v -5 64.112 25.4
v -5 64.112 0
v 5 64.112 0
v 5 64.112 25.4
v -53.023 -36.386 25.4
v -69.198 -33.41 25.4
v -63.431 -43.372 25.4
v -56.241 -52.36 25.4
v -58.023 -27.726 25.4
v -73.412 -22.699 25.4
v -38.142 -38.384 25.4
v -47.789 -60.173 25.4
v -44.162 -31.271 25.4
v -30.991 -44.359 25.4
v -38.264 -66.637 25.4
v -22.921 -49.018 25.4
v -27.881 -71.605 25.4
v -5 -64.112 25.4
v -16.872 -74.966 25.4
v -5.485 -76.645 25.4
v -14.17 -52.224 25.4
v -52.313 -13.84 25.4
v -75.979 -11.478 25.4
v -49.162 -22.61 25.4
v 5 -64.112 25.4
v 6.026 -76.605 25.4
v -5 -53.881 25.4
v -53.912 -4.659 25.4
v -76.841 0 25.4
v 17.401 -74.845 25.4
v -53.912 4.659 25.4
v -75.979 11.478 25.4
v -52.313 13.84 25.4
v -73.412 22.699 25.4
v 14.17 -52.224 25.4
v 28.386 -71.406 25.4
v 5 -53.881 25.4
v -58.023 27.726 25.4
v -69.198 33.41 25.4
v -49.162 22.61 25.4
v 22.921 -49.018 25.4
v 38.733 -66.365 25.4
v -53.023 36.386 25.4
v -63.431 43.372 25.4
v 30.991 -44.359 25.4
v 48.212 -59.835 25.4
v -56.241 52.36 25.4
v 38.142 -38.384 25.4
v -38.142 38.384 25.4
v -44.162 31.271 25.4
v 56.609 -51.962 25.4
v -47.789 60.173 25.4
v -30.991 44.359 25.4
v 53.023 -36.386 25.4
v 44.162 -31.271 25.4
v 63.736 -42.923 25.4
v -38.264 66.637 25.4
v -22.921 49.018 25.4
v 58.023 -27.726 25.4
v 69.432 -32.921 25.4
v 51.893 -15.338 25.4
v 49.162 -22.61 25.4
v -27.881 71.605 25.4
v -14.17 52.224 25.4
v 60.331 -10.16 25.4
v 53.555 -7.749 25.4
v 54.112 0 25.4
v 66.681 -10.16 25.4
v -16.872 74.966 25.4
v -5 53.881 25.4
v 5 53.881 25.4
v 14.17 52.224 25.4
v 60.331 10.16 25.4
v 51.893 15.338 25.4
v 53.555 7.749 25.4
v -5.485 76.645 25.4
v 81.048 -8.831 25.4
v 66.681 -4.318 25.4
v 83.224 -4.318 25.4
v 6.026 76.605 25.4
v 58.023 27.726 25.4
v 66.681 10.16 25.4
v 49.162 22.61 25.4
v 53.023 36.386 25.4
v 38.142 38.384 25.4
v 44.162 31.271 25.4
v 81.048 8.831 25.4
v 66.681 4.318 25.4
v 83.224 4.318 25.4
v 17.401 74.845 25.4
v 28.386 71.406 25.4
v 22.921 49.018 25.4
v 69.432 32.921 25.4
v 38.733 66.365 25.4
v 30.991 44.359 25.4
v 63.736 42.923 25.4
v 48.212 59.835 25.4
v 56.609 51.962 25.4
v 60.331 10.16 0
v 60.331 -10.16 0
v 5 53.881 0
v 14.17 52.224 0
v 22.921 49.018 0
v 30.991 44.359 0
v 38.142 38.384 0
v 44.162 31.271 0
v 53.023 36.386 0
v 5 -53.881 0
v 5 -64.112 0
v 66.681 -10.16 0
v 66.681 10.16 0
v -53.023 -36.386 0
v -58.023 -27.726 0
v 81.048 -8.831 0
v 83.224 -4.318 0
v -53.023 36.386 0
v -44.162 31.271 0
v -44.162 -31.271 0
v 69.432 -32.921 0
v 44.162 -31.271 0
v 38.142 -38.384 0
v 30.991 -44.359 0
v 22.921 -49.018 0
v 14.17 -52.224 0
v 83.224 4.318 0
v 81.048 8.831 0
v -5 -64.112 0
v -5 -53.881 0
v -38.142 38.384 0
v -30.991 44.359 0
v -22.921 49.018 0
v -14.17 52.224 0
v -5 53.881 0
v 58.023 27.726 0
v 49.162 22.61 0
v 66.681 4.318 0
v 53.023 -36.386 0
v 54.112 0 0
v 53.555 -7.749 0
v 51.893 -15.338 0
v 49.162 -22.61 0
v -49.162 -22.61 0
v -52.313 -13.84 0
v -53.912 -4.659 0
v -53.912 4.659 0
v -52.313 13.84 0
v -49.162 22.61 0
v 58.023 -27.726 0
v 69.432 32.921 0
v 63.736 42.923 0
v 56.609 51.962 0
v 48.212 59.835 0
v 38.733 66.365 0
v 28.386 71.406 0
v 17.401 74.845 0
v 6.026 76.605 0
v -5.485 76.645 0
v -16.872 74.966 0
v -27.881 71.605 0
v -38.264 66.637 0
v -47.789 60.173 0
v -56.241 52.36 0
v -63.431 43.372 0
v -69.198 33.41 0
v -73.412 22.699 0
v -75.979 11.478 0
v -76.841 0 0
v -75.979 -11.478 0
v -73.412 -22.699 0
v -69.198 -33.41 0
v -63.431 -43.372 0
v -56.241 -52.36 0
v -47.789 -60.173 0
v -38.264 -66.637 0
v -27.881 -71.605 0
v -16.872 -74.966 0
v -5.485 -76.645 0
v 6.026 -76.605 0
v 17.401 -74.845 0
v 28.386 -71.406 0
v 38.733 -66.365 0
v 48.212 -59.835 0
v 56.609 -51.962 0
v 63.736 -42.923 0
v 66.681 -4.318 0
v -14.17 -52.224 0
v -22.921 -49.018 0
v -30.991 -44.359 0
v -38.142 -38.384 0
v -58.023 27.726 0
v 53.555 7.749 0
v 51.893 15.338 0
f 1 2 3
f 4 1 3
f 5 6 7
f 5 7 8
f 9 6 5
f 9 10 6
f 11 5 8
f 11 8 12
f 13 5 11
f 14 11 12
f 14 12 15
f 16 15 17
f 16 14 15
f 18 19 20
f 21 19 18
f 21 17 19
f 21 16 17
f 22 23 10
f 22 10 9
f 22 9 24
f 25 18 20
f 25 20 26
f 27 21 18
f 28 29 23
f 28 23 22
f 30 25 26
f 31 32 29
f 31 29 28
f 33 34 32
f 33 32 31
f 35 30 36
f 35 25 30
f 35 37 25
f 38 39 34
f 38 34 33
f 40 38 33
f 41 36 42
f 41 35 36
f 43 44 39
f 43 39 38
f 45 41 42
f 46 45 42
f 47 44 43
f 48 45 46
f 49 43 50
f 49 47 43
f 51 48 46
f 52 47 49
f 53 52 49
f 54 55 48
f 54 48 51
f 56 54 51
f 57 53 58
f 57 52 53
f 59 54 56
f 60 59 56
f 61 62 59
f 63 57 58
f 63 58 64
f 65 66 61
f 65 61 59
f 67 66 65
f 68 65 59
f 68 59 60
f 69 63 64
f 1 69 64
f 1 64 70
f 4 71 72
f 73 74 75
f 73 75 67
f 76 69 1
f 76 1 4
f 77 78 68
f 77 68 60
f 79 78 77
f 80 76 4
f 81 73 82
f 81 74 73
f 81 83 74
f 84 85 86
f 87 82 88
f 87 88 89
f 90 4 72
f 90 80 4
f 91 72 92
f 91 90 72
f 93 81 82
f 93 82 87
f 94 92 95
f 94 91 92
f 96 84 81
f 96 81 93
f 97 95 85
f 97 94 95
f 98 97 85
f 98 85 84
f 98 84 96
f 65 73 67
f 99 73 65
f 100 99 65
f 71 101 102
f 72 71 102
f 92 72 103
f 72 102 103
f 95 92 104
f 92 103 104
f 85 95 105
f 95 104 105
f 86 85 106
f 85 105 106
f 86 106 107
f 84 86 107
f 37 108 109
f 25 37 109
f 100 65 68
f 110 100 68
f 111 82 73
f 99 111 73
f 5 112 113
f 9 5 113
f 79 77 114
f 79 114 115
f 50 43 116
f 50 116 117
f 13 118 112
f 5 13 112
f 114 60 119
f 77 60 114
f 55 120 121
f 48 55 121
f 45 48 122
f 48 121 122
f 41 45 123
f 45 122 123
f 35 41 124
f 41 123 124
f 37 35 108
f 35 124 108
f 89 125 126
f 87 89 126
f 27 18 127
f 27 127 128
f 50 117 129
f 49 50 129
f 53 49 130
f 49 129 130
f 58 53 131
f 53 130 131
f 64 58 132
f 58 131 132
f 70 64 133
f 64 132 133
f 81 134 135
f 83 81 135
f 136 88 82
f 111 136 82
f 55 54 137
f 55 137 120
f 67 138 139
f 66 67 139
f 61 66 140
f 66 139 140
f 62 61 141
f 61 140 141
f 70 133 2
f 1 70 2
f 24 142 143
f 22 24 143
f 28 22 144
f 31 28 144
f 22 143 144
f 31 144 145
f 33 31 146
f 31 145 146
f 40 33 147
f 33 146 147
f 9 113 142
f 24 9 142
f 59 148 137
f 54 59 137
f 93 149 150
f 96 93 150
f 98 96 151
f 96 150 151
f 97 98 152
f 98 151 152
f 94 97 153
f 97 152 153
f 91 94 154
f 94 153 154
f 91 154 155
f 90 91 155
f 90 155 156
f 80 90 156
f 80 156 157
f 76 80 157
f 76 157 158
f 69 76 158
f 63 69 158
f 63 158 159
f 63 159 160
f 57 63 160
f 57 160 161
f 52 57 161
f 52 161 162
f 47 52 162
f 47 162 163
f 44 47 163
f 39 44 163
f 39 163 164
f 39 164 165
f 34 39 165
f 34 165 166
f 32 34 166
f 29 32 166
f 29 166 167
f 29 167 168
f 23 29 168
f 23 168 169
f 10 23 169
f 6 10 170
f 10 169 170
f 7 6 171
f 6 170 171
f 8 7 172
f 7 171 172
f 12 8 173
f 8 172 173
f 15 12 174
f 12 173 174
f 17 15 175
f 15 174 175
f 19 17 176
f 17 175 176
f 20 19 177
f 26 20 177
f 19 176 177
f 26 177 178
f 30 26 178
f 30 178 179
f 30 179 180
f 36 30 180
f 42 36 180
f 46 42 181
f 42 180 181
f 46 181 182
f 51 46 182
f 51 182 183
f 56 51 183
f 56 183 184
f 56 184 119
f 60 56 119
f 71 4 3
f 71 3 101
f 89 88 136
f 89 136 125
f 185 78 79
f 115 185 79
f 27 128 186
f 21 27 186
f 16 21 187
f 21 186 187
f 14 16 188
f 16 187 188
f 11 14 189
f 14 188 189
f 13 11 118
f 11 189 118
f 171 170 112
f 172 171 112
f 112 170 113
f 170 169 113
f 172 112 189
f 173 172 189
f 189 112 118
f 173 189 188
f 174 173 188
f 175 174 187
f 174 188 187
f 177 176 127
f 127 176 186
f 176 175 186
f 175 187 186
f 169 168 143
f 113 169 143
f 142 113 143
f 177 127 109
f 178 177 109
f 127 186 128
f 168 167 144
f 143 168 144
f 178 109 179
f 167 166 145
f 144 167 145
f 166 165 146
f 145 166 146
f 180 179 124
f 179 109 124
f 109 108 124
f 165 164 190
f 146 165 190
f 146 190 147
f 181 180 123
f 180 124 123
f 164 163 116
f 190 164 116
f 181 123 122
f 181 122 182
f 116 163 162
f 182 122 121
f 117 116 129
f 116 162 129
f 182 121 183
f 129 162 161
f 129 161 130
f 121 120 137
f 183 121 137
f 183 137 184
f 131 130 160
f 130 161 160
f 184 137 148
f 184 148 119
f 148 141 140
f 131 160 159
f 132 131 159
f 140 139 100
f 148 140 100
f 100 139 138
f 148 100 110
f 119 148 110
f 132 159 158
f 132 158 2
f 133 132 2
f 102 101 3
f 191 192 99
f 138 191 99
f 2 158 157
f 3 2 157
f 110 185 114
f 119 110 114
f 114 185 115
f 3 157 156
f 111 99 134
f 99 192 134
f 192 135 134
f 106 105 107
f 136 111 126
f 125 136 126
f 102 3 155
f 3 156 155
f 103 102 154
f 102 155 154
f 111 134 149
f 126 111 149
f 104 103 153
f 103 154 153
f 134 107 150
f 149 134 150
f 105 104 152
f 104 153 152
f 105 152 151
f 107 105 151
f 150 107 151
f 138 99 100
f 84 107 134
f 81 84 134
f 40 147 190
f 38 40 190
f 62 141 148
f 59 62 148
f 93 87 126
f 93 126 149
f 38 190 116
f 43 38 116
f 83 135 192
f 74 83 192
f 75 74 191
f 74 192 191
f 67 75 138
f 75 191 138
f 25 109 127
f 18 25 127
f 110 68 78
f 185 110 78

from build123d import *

# Parameters (mm, degrees)
F0_R     = 76.841269309
F1_DEPTH = 25.4
F3_DEPTH = 2540
F4_DEPTH = 25.4


with BuildPart() as f1:
    # F0 (on Top) → F1 (new body)
    with BuildSketch(Plane.XY):
        Circle(F0_R)
        with BuildLine():
            ThreePointArc((49.1623187614, 22.610375279), (52.8604702506, 11.5729573203), (54.1125, 0))
            ThreePointArc((54.1125, 0), (52.8604702506, -11.5729573203), (49.1623187614, -22.610375279))
            Line((49.1623187614, -22.610375279), (58.0230537001, -27.7261229811))
            Line((58.0230537001, -27.7261229811), (53.0230537001, -36.3863770189))
            Line((53.0230537001, -36.3863770189), (44.1623187614, -31.2706293168))
            ThreePointArc((44.1623187614, -31.2706293168), (27.05625, -46.8627996623), (5, -53.8810045958))
            Line((5, -53.8810045958), (5, -64.1125))
            Line((5, -64.1125), (-5, -64.1125))
            Line((-5, -64.1125), (-5, -53.8810045958))
            ThreePointArc((-5, -53.8810045958), (-27.05625, -46.8627996623), (-44.1623187614, -31.2706293168))
            Line((-44.1623187614, -31.2706293168), (-53.0230537001, -36.3863770189))
            Line((-53.0230537001, -36.3863770189), (-58.0230537001, -27.7261229811))
            Line((-58.0230537001, -27.7261229811), (-49.1623187614, -22.610375279))
            ThreePointArc((-49.1623187614, -22.610375279), (-54.1125, 0), (-49.1623187614, 22.610375279))
            Line((-49.1623187614, 22.610375279), (-58.0230537001, 27.7261229811))
            Line((-58.0230537001, 27.7261229811), (-53.0230537001, 36.3863770189))
            Line((-53.0230537001, 36.3863770189), (-44.1623187614, 31.2706293168))
            ThreePointArc((-44.1623187614, 31.2706293168), (-27.05625, 46.8627996623), (-5, 53.8810045958))
            Line((-5, 53.8810045958), (-5, 64.1125))
            Line((-5, 64.1125), (5, 64.1125))
            Line((5, 64.1125), (5, 53.8810045958))
            ThreePointArc((5, 53.8810045958), (27.05625, 46.8627996623), (44.1623187614, 31.2706293168))
            Line((44.1623187614, 31.2706293168), (53.0230537001, 36.3863770189))
            Line((53.0230537001, 36.3863770189), (58.0230537001, 27.7261229811))
            Line((58.0230537001, 27.7261229811), (49.1623187614, 22.610375279))
        make_face(mode=Mode.SUBTRACT)
    extrude(amount=F1_DEPTH)

    # F2 (on face) → F3 (cut)
    with BuildSketch(Plane.XY.offset(25.4)):
        with BuildLine():
            Line((60.331269309, 0), (76.841269309, 0))
            ThreePointArc((76.841269309, 0), (76.8109087462, 2.1598533743), (76.7198510493, 4.318))
            Line((76.7198510493, 4.318), (71.6383990579, 4.318))
            Line((71.6383990579, 4.318), (66.681269309, 4.318))
            Line((66.681269309, 4.318), (66.681269309, 10.16))
            Line((66.681269309, 10.16), (60.331269309, 10.16))
            Line((60.331269309, 10.16), (60.331269309, 0))
        make_face()
        with BuildLine():
            Line((66.681269309, -4.318), (71.6383990579, -4.318))
            Line((71.6383990579, -4.318), (76.7198510493, -4.318))
            ThreePointArc((76.7198510493, -4.318), (76.8109087462, -2.1598533743), (76.841269309, 0))
            Line((76.841269309, 0), (60.331269309, 0))
            Line((60.331269309, 0), (60.331269309, -10.16))
            Line((60.331269309, -10.16), (66.681269309, -10.16))
            Line((66.681269309, -10.16), (66.681269309, -4.318))
        make_face()
    extrude(amount=-F3_DEPTH, mode=Mode.SUBTRACT)

    # F2 (on face) → F4 (join)
    with BuildSketch(Plane.XY.offset(25.4)):
        with BuildLine():
            Line((81.0480539402, 8.8309641961), (69.4320089527, 32.9207655108))
            ThreePointArc((69.4320089527, 32.9207655108), (72.3316680057, 25.93666271), (74.5307966821, 18.7013639864))
            add(Edge.make_bspline(
                [(74.5307966821, 18.7013639864), (75.9347240562, 15.3777124362), (77.4050082281, 12.5783342613), (78.9966583252, 10.7205696404)],
                knots=[0.3571653837, 0.3571653837, 0.3571653837, 0.3571653837, 0.6407462723, 0.6407462723, 0.6407462723, 0.6407462723], degree=3))
            add(Edge.make_bspline(
                [(78.9966583252, 10.7205696404), (79.6616242514, 9.944425327), (80.3477738062, 9.3326335024), (81.0480539402, 8.8309641961)],
                knots=[0.6407462723, 0.6407462723, 0.6407462723, 0.6407462723, 0.759221827, 0.759221827, 0.759221827, 0.759221827], degree=3))
        make_face()
        with BuildLine():
            add(Edge.make_bspline(
                [(74.5307966821, 18.7013639864), (75.9347240562, 15.3777124362), (77.4050082281, 12.5783342613), (78.9966583252, 10.7205696404)],
                knots=[0.3571653837, 0.3571653837, 0.3571653837, 0.3571653837, 0.6407462723, 0.6407462723, 0.6407462723, 0.6407462723], degree=3))
            ThreePointArc((74.5307966821, 18.7013639864), (75.4668021106, 14.4686712665), (76.1626284874, 10.1899308588))
            Line((76.1626284874, 10.1899308588), (78.9966583252, 10.7205696404))
        make_face()
        with BuildLine():
            ThreePointArc((76.1626284874, 10.1899308588), (76.4976014678, 7.2593139274), (76.7198510493, 4.318))
            Line((76.7198510493, 4.318), (76.841269309, 4.318))
            Line((76.841269309, 4.318), (83.2241945586, 4.318))
            Line((83.2241945586, 4.318), (78.9966583252, 10.7205696404))
            Line((78.9966583252, 10.7205696404), (76.1626284874, 10.1899308588))
        make_face()
        with BuildLine():
            Line((83.2241945586, 4.318), (81.0480539402, 8.8309641961))
            add(Edge.make_bspline(
                [(78.9966583252, 10.7205696404), (79.6616242514, 9.944425327), (80.3477738062, 9.3326335024), (81.0480539402, 8.8309641961)],
                knots=[0.6407462723, 0.6407462723, 0.6407462723, 0.6407462723, 0.759221827, 0.759221827, 0.759221827, 0.759221827], degree=3))
            Line((78.9966583252, 10.7205696404), (83.2241945586, 4.318))
        make_face()
        with BuildLine():
            ThreePointArc((76.7198510493, -4.318), (76.4976014678, -7.2593139274), (76.1626284874, -10.1899308588))
            Line((76.1626284874, -10.1899308588), (78.9966583252, -10.7205696404))
            add(Edge.make_bspline(
                [(78.9966583252, -10.7205696404), (79.6616242514, -9.944425327), (80.3477738062, -9.3326335024), (81.0480539402, -8.8309641961)],
                knots=[0.6407462723, 0.6407462723, 0.6407462723, 0.6407462723, 0.759221827, 0.759221827, 0.759221827, 0.759221827], degree=3))
            Line((81.0480539402, -8.8309641961), (83.2241945586, -4.318))
            Line((83.2241945586, -4.318), (76.841269309, -4.318))
            Line((76.841269309, -4.318), (76.7198510493, -4.318))
        make_face()
        with BuildLine():
            add(Edge.make_bspline(
                [(78.9966583252, -10.7205696404), (79.6616242514, -9.944425327), (80.3477738062, -9.3326335024), (81.0480539402, -8.8309641961)],
                knots=[0.6407462723, 0.6407462723, 0.6407462723, 0.6407462723, 0.759221827, 0.759221827, 0.759221827, 0.759221827], degree=3))
            add(Edge.make_bspline(
                [(74.5307966821, -18.7013639864), (75.9347240562, -15.3777124362), (77.4050082281, -12.5783342613), (78.9966583252, -10.7205696404)],
                knots=[0.3571653837, 0.3571653837, 0.3571653837, 0.3571653837, 0.6407462723, 0.6407462723, 0.6407462723, 0.6407462723], degree=3))
            ThreePointArc((74.5307966821, -18.7013639864), (72.3316680057, -25.93666271), (69.4320089527, -32.9207655108))
            Line((69.4320089527, -32.9207655108), (81.0480539402, -8.8309641961))
        make_face()
        with BuildLine():
            Line((78.9966583252, -10.7205696404), (76.1626284874, -10.1899308588))
            ThreePointArc((76.1626284874, -10.1899308588), (75.4668021106, -14.4686712665), (74.5307966821, -18.7013639864))
            add(Edge.make_bspline(
                [(74.5307966821, -18.7013639864), (75.9347240562, -15.3777124362), (77.4050082281, -12.5783342613), (78.9966583252, -10.7205696404)],
                knots=[0.3571653837, 0.3571653837, 0.3571653837, 0.3571653837, 0.6407462723, 0.6407462723, 0.6407462723, 0.6407462723], degree=3))
        make_face()
    extrude(amount=-F4_DEPTH)


solid = f1.part
